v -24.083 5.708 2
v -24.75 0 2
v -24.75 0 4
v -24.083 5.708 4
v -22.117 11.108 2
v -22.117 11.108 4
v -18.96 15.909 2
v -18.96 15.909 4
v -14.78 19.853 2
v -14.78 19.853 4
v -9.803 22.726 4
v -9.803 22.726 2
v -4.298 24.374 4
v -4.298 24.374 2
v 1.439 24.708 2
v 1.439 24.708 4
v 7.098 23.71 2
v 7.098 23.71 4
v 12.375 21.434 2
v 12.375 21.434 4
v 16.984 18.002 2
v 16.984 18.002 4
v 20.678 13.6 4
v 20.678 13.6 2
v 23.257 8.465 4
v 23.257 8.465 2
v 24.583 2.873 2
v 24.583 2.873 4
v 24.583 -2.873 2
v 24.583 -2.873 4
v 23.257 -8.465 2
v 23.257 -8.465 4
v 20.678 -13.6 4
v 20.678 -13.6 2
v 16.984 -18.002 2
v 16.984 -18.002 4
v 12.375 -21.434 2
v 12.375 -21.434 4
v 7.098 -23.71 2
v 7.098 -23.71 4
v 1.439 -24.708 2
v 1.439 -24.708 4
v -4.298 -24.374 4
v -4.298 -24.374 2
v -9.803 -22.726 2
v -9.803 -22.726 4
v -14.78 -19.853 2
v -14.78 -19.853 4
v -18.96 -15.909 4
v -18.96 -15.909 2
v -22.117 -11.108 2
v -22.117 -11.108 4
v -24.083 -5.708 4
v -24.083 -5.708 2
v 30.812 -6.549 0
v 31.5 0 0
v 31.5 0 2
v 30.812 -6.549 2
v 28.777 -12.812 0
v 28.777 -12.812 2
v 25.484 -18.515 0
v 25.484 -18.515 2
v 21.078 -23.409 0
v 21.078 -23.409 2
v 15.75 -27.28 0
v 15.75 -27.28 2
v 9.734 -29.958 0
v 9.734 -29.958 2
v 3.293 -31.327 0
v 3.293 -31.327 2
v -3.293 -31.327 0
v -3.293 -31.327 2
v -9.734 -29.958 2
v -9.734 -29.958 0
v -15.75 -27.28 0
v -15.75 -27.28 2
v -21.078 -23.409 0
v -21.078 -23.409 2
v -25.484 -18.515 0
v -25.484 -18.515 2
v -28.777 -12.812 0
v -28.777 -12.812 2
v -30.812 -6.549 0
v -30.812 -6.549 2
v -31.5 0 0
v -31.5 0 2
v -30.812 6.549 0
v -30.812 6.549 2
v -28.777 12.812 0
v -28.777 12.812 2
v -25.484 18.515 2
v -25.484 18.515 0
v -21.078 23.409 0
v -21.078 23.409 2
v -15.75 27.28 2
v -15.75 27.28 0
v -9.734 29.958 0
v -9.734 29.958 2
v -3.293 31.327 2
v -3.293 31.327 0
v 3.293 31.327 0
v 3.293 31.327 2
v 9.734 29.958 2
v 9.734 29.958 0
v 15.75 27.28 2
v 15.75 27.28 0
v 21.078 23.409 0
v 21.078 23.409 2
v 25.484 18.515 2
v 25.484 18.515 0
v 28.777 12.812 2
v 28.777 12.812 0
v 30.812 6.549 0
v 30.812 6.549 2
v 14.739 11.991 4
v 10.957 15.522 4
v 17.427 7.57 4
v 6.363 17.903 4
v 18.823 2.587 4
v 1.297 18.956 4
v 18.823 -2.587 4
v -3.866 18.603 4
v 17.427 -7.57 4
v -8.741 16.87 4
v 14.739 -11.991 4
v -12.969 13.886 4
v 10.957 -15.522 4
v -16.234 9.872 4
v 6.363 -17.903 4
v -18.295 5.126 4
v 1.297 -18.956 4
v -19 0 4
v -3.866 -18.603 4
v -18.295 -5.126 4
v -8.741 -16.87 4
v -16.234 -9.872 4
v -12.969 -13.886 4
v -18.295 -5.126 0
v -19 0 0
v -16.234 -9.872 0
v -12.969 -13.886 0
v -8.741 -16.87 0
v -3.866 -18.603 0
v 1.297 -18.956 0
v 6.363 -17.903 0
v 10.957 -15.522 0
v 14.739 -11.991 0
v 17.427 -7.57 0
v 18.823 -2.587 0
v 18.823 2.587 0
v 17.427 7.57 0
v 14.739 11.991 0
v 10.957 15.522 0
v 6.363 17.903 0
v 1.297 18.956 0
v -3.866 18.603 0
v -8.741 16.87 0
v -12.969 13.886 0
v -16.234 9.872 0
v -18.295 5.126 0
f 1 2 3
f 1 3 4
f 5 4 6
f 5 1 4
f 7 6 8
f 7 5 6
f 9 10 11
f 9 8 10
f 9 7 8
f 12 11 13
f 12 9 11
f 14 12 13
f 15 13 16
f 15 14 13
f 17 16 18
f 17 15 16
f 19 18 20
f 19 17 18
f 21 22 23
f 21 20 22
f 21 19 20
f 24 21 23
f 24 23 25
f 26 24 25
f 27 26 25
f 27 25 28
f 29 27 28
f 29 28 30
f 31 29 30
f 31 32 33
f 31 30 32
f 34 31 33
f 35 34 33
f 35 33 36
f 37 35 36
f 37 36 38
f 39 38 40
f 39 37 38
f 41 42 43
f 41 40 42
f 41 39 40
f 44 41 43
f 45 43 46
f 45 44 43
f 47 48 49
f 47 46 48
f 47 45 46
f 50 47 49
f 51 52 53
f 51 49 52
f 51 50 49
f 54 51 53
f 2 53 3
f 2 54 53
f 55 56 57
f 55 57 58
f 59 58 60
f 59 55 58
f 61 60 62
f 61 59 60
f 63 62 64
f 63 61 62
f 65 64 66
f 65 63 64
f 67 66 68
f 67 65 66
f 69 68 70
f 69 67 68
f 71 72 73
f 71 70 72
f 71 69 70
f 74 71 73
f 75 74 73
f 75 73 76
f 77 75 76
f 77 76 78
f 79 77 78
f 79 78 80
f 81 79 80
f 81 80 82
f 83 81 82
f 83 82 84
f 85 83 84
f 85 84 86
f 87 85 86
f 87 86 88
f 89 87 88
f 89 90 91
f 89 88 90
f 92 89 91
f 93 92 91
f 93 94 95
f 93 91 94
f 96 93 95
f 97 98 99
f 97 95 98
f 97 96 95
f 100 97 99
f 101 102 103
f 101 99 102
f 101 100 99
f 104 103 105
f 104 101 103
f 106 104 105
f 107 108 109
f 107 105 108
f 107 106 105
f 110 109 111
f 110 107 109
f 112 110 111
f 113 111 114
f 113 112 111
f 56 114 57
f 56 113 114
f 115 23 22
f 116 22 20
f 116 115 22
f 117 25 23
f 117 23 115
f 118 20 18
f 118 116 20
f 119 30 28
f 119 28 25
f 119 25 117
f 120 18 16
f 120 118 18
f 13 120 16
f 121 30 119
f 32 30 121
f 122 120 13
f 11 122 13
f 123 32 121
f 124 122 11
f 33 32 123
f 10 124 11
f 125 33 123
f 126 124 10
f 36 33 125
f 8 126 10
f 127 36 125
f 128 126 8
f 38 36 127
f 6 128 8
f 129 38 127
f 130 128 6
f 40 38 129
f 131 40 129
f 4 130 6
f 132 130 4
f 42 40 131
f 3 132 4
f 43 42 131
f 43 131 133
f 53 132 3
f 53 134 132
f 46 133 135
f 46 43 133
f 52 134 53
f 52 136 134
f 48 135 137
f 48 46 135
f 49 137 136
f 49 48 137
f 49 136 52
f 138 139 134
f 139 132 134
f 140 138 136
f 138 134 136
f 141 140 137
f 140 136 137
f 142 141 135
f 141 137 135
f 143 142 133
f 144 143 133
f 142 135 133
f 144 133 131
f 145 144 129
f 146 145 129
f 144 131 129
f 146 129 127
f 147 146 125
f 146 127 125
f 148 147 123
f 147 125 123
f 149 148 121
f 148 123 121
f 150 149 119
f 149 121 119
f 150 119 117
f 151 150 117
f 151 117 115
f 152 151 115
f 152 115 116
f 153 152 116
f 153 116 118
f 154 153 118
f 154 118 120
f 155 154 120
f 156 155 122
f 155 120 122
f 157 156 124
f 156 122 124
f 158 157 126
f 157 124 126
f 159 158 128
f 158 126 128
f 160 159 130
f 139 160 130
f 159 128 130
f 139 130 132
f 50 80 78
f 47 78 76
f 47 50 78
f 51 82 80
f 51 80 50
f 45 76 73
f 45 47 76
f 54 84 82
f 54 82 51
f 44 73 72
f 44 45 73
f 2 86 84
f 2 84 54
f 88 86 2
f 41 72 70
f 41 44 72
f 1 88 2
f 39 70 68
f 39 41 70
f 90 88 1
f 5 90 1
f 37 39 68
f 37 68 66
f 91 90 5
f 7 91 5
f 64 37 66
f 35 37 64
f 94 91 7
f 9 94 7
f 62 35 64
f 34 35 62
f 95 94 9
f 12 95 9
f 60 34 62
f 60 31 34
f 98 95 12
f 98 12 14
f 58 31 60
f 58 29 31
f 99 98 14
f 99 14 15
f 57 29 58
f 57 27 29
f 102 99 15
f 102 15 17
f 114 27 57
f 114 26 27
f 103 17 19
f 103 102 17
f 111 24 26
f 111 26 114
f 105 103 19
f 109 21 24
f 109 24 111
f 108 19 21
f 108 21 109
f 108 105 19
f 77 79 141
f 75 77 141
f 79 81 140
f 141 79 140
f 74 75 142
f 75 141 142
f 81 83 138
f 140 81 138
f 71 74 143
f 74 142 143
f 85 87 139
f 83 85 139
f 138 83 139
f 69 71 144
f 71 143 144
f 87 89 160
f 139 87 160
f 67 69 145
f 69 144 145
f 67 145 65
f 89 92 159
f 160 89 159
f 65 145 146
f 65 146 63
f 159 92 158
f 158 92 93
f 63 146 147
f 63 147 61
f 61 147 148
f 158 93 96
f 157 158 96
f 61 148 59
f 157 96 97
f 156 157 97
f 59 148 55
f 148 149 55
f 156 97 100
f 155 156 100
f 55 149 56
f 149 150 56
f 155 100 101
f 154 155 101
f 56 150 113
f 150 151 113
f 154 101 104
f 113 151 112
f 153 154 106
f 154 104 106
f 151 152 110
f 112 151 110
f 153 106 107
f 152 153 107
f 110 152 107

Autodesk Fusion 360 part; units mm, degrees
sketch "Sketch1" plane through (0, 0, 0) normal (0, 0, 1) x (1, 0, 0)
  circle A0 centre (0, 0) radius 31.5
  dimension "d1" = 63
extrude "Extrude1" add sketch "Sketch1" along normal blind 2
sketch "Sketch2" plane through (0, 0, 2) normal (0, 0, 1) x (-1, 0, 0)
  circle A0 centre (0, 0) radius 31.5
  circle A1 centre (0, 0) radius 24.75
  dimension "d4" = 49.5
extrude "Extrude2" add sketch "Sketch2" along normal blind 2 contours A1
sketch "Sketch3" plane through (0, 0, 4) normal (0, 0, 1) x (-1, 0, 0)
  circle A0 centre (0, 0) radius 24.75
  circle A1 centre (0, 0) radius 19
  dimension "d7" = 38
extrude "Extrude3" cut sketch "Sketch3" against normal blind 30 contours A1
